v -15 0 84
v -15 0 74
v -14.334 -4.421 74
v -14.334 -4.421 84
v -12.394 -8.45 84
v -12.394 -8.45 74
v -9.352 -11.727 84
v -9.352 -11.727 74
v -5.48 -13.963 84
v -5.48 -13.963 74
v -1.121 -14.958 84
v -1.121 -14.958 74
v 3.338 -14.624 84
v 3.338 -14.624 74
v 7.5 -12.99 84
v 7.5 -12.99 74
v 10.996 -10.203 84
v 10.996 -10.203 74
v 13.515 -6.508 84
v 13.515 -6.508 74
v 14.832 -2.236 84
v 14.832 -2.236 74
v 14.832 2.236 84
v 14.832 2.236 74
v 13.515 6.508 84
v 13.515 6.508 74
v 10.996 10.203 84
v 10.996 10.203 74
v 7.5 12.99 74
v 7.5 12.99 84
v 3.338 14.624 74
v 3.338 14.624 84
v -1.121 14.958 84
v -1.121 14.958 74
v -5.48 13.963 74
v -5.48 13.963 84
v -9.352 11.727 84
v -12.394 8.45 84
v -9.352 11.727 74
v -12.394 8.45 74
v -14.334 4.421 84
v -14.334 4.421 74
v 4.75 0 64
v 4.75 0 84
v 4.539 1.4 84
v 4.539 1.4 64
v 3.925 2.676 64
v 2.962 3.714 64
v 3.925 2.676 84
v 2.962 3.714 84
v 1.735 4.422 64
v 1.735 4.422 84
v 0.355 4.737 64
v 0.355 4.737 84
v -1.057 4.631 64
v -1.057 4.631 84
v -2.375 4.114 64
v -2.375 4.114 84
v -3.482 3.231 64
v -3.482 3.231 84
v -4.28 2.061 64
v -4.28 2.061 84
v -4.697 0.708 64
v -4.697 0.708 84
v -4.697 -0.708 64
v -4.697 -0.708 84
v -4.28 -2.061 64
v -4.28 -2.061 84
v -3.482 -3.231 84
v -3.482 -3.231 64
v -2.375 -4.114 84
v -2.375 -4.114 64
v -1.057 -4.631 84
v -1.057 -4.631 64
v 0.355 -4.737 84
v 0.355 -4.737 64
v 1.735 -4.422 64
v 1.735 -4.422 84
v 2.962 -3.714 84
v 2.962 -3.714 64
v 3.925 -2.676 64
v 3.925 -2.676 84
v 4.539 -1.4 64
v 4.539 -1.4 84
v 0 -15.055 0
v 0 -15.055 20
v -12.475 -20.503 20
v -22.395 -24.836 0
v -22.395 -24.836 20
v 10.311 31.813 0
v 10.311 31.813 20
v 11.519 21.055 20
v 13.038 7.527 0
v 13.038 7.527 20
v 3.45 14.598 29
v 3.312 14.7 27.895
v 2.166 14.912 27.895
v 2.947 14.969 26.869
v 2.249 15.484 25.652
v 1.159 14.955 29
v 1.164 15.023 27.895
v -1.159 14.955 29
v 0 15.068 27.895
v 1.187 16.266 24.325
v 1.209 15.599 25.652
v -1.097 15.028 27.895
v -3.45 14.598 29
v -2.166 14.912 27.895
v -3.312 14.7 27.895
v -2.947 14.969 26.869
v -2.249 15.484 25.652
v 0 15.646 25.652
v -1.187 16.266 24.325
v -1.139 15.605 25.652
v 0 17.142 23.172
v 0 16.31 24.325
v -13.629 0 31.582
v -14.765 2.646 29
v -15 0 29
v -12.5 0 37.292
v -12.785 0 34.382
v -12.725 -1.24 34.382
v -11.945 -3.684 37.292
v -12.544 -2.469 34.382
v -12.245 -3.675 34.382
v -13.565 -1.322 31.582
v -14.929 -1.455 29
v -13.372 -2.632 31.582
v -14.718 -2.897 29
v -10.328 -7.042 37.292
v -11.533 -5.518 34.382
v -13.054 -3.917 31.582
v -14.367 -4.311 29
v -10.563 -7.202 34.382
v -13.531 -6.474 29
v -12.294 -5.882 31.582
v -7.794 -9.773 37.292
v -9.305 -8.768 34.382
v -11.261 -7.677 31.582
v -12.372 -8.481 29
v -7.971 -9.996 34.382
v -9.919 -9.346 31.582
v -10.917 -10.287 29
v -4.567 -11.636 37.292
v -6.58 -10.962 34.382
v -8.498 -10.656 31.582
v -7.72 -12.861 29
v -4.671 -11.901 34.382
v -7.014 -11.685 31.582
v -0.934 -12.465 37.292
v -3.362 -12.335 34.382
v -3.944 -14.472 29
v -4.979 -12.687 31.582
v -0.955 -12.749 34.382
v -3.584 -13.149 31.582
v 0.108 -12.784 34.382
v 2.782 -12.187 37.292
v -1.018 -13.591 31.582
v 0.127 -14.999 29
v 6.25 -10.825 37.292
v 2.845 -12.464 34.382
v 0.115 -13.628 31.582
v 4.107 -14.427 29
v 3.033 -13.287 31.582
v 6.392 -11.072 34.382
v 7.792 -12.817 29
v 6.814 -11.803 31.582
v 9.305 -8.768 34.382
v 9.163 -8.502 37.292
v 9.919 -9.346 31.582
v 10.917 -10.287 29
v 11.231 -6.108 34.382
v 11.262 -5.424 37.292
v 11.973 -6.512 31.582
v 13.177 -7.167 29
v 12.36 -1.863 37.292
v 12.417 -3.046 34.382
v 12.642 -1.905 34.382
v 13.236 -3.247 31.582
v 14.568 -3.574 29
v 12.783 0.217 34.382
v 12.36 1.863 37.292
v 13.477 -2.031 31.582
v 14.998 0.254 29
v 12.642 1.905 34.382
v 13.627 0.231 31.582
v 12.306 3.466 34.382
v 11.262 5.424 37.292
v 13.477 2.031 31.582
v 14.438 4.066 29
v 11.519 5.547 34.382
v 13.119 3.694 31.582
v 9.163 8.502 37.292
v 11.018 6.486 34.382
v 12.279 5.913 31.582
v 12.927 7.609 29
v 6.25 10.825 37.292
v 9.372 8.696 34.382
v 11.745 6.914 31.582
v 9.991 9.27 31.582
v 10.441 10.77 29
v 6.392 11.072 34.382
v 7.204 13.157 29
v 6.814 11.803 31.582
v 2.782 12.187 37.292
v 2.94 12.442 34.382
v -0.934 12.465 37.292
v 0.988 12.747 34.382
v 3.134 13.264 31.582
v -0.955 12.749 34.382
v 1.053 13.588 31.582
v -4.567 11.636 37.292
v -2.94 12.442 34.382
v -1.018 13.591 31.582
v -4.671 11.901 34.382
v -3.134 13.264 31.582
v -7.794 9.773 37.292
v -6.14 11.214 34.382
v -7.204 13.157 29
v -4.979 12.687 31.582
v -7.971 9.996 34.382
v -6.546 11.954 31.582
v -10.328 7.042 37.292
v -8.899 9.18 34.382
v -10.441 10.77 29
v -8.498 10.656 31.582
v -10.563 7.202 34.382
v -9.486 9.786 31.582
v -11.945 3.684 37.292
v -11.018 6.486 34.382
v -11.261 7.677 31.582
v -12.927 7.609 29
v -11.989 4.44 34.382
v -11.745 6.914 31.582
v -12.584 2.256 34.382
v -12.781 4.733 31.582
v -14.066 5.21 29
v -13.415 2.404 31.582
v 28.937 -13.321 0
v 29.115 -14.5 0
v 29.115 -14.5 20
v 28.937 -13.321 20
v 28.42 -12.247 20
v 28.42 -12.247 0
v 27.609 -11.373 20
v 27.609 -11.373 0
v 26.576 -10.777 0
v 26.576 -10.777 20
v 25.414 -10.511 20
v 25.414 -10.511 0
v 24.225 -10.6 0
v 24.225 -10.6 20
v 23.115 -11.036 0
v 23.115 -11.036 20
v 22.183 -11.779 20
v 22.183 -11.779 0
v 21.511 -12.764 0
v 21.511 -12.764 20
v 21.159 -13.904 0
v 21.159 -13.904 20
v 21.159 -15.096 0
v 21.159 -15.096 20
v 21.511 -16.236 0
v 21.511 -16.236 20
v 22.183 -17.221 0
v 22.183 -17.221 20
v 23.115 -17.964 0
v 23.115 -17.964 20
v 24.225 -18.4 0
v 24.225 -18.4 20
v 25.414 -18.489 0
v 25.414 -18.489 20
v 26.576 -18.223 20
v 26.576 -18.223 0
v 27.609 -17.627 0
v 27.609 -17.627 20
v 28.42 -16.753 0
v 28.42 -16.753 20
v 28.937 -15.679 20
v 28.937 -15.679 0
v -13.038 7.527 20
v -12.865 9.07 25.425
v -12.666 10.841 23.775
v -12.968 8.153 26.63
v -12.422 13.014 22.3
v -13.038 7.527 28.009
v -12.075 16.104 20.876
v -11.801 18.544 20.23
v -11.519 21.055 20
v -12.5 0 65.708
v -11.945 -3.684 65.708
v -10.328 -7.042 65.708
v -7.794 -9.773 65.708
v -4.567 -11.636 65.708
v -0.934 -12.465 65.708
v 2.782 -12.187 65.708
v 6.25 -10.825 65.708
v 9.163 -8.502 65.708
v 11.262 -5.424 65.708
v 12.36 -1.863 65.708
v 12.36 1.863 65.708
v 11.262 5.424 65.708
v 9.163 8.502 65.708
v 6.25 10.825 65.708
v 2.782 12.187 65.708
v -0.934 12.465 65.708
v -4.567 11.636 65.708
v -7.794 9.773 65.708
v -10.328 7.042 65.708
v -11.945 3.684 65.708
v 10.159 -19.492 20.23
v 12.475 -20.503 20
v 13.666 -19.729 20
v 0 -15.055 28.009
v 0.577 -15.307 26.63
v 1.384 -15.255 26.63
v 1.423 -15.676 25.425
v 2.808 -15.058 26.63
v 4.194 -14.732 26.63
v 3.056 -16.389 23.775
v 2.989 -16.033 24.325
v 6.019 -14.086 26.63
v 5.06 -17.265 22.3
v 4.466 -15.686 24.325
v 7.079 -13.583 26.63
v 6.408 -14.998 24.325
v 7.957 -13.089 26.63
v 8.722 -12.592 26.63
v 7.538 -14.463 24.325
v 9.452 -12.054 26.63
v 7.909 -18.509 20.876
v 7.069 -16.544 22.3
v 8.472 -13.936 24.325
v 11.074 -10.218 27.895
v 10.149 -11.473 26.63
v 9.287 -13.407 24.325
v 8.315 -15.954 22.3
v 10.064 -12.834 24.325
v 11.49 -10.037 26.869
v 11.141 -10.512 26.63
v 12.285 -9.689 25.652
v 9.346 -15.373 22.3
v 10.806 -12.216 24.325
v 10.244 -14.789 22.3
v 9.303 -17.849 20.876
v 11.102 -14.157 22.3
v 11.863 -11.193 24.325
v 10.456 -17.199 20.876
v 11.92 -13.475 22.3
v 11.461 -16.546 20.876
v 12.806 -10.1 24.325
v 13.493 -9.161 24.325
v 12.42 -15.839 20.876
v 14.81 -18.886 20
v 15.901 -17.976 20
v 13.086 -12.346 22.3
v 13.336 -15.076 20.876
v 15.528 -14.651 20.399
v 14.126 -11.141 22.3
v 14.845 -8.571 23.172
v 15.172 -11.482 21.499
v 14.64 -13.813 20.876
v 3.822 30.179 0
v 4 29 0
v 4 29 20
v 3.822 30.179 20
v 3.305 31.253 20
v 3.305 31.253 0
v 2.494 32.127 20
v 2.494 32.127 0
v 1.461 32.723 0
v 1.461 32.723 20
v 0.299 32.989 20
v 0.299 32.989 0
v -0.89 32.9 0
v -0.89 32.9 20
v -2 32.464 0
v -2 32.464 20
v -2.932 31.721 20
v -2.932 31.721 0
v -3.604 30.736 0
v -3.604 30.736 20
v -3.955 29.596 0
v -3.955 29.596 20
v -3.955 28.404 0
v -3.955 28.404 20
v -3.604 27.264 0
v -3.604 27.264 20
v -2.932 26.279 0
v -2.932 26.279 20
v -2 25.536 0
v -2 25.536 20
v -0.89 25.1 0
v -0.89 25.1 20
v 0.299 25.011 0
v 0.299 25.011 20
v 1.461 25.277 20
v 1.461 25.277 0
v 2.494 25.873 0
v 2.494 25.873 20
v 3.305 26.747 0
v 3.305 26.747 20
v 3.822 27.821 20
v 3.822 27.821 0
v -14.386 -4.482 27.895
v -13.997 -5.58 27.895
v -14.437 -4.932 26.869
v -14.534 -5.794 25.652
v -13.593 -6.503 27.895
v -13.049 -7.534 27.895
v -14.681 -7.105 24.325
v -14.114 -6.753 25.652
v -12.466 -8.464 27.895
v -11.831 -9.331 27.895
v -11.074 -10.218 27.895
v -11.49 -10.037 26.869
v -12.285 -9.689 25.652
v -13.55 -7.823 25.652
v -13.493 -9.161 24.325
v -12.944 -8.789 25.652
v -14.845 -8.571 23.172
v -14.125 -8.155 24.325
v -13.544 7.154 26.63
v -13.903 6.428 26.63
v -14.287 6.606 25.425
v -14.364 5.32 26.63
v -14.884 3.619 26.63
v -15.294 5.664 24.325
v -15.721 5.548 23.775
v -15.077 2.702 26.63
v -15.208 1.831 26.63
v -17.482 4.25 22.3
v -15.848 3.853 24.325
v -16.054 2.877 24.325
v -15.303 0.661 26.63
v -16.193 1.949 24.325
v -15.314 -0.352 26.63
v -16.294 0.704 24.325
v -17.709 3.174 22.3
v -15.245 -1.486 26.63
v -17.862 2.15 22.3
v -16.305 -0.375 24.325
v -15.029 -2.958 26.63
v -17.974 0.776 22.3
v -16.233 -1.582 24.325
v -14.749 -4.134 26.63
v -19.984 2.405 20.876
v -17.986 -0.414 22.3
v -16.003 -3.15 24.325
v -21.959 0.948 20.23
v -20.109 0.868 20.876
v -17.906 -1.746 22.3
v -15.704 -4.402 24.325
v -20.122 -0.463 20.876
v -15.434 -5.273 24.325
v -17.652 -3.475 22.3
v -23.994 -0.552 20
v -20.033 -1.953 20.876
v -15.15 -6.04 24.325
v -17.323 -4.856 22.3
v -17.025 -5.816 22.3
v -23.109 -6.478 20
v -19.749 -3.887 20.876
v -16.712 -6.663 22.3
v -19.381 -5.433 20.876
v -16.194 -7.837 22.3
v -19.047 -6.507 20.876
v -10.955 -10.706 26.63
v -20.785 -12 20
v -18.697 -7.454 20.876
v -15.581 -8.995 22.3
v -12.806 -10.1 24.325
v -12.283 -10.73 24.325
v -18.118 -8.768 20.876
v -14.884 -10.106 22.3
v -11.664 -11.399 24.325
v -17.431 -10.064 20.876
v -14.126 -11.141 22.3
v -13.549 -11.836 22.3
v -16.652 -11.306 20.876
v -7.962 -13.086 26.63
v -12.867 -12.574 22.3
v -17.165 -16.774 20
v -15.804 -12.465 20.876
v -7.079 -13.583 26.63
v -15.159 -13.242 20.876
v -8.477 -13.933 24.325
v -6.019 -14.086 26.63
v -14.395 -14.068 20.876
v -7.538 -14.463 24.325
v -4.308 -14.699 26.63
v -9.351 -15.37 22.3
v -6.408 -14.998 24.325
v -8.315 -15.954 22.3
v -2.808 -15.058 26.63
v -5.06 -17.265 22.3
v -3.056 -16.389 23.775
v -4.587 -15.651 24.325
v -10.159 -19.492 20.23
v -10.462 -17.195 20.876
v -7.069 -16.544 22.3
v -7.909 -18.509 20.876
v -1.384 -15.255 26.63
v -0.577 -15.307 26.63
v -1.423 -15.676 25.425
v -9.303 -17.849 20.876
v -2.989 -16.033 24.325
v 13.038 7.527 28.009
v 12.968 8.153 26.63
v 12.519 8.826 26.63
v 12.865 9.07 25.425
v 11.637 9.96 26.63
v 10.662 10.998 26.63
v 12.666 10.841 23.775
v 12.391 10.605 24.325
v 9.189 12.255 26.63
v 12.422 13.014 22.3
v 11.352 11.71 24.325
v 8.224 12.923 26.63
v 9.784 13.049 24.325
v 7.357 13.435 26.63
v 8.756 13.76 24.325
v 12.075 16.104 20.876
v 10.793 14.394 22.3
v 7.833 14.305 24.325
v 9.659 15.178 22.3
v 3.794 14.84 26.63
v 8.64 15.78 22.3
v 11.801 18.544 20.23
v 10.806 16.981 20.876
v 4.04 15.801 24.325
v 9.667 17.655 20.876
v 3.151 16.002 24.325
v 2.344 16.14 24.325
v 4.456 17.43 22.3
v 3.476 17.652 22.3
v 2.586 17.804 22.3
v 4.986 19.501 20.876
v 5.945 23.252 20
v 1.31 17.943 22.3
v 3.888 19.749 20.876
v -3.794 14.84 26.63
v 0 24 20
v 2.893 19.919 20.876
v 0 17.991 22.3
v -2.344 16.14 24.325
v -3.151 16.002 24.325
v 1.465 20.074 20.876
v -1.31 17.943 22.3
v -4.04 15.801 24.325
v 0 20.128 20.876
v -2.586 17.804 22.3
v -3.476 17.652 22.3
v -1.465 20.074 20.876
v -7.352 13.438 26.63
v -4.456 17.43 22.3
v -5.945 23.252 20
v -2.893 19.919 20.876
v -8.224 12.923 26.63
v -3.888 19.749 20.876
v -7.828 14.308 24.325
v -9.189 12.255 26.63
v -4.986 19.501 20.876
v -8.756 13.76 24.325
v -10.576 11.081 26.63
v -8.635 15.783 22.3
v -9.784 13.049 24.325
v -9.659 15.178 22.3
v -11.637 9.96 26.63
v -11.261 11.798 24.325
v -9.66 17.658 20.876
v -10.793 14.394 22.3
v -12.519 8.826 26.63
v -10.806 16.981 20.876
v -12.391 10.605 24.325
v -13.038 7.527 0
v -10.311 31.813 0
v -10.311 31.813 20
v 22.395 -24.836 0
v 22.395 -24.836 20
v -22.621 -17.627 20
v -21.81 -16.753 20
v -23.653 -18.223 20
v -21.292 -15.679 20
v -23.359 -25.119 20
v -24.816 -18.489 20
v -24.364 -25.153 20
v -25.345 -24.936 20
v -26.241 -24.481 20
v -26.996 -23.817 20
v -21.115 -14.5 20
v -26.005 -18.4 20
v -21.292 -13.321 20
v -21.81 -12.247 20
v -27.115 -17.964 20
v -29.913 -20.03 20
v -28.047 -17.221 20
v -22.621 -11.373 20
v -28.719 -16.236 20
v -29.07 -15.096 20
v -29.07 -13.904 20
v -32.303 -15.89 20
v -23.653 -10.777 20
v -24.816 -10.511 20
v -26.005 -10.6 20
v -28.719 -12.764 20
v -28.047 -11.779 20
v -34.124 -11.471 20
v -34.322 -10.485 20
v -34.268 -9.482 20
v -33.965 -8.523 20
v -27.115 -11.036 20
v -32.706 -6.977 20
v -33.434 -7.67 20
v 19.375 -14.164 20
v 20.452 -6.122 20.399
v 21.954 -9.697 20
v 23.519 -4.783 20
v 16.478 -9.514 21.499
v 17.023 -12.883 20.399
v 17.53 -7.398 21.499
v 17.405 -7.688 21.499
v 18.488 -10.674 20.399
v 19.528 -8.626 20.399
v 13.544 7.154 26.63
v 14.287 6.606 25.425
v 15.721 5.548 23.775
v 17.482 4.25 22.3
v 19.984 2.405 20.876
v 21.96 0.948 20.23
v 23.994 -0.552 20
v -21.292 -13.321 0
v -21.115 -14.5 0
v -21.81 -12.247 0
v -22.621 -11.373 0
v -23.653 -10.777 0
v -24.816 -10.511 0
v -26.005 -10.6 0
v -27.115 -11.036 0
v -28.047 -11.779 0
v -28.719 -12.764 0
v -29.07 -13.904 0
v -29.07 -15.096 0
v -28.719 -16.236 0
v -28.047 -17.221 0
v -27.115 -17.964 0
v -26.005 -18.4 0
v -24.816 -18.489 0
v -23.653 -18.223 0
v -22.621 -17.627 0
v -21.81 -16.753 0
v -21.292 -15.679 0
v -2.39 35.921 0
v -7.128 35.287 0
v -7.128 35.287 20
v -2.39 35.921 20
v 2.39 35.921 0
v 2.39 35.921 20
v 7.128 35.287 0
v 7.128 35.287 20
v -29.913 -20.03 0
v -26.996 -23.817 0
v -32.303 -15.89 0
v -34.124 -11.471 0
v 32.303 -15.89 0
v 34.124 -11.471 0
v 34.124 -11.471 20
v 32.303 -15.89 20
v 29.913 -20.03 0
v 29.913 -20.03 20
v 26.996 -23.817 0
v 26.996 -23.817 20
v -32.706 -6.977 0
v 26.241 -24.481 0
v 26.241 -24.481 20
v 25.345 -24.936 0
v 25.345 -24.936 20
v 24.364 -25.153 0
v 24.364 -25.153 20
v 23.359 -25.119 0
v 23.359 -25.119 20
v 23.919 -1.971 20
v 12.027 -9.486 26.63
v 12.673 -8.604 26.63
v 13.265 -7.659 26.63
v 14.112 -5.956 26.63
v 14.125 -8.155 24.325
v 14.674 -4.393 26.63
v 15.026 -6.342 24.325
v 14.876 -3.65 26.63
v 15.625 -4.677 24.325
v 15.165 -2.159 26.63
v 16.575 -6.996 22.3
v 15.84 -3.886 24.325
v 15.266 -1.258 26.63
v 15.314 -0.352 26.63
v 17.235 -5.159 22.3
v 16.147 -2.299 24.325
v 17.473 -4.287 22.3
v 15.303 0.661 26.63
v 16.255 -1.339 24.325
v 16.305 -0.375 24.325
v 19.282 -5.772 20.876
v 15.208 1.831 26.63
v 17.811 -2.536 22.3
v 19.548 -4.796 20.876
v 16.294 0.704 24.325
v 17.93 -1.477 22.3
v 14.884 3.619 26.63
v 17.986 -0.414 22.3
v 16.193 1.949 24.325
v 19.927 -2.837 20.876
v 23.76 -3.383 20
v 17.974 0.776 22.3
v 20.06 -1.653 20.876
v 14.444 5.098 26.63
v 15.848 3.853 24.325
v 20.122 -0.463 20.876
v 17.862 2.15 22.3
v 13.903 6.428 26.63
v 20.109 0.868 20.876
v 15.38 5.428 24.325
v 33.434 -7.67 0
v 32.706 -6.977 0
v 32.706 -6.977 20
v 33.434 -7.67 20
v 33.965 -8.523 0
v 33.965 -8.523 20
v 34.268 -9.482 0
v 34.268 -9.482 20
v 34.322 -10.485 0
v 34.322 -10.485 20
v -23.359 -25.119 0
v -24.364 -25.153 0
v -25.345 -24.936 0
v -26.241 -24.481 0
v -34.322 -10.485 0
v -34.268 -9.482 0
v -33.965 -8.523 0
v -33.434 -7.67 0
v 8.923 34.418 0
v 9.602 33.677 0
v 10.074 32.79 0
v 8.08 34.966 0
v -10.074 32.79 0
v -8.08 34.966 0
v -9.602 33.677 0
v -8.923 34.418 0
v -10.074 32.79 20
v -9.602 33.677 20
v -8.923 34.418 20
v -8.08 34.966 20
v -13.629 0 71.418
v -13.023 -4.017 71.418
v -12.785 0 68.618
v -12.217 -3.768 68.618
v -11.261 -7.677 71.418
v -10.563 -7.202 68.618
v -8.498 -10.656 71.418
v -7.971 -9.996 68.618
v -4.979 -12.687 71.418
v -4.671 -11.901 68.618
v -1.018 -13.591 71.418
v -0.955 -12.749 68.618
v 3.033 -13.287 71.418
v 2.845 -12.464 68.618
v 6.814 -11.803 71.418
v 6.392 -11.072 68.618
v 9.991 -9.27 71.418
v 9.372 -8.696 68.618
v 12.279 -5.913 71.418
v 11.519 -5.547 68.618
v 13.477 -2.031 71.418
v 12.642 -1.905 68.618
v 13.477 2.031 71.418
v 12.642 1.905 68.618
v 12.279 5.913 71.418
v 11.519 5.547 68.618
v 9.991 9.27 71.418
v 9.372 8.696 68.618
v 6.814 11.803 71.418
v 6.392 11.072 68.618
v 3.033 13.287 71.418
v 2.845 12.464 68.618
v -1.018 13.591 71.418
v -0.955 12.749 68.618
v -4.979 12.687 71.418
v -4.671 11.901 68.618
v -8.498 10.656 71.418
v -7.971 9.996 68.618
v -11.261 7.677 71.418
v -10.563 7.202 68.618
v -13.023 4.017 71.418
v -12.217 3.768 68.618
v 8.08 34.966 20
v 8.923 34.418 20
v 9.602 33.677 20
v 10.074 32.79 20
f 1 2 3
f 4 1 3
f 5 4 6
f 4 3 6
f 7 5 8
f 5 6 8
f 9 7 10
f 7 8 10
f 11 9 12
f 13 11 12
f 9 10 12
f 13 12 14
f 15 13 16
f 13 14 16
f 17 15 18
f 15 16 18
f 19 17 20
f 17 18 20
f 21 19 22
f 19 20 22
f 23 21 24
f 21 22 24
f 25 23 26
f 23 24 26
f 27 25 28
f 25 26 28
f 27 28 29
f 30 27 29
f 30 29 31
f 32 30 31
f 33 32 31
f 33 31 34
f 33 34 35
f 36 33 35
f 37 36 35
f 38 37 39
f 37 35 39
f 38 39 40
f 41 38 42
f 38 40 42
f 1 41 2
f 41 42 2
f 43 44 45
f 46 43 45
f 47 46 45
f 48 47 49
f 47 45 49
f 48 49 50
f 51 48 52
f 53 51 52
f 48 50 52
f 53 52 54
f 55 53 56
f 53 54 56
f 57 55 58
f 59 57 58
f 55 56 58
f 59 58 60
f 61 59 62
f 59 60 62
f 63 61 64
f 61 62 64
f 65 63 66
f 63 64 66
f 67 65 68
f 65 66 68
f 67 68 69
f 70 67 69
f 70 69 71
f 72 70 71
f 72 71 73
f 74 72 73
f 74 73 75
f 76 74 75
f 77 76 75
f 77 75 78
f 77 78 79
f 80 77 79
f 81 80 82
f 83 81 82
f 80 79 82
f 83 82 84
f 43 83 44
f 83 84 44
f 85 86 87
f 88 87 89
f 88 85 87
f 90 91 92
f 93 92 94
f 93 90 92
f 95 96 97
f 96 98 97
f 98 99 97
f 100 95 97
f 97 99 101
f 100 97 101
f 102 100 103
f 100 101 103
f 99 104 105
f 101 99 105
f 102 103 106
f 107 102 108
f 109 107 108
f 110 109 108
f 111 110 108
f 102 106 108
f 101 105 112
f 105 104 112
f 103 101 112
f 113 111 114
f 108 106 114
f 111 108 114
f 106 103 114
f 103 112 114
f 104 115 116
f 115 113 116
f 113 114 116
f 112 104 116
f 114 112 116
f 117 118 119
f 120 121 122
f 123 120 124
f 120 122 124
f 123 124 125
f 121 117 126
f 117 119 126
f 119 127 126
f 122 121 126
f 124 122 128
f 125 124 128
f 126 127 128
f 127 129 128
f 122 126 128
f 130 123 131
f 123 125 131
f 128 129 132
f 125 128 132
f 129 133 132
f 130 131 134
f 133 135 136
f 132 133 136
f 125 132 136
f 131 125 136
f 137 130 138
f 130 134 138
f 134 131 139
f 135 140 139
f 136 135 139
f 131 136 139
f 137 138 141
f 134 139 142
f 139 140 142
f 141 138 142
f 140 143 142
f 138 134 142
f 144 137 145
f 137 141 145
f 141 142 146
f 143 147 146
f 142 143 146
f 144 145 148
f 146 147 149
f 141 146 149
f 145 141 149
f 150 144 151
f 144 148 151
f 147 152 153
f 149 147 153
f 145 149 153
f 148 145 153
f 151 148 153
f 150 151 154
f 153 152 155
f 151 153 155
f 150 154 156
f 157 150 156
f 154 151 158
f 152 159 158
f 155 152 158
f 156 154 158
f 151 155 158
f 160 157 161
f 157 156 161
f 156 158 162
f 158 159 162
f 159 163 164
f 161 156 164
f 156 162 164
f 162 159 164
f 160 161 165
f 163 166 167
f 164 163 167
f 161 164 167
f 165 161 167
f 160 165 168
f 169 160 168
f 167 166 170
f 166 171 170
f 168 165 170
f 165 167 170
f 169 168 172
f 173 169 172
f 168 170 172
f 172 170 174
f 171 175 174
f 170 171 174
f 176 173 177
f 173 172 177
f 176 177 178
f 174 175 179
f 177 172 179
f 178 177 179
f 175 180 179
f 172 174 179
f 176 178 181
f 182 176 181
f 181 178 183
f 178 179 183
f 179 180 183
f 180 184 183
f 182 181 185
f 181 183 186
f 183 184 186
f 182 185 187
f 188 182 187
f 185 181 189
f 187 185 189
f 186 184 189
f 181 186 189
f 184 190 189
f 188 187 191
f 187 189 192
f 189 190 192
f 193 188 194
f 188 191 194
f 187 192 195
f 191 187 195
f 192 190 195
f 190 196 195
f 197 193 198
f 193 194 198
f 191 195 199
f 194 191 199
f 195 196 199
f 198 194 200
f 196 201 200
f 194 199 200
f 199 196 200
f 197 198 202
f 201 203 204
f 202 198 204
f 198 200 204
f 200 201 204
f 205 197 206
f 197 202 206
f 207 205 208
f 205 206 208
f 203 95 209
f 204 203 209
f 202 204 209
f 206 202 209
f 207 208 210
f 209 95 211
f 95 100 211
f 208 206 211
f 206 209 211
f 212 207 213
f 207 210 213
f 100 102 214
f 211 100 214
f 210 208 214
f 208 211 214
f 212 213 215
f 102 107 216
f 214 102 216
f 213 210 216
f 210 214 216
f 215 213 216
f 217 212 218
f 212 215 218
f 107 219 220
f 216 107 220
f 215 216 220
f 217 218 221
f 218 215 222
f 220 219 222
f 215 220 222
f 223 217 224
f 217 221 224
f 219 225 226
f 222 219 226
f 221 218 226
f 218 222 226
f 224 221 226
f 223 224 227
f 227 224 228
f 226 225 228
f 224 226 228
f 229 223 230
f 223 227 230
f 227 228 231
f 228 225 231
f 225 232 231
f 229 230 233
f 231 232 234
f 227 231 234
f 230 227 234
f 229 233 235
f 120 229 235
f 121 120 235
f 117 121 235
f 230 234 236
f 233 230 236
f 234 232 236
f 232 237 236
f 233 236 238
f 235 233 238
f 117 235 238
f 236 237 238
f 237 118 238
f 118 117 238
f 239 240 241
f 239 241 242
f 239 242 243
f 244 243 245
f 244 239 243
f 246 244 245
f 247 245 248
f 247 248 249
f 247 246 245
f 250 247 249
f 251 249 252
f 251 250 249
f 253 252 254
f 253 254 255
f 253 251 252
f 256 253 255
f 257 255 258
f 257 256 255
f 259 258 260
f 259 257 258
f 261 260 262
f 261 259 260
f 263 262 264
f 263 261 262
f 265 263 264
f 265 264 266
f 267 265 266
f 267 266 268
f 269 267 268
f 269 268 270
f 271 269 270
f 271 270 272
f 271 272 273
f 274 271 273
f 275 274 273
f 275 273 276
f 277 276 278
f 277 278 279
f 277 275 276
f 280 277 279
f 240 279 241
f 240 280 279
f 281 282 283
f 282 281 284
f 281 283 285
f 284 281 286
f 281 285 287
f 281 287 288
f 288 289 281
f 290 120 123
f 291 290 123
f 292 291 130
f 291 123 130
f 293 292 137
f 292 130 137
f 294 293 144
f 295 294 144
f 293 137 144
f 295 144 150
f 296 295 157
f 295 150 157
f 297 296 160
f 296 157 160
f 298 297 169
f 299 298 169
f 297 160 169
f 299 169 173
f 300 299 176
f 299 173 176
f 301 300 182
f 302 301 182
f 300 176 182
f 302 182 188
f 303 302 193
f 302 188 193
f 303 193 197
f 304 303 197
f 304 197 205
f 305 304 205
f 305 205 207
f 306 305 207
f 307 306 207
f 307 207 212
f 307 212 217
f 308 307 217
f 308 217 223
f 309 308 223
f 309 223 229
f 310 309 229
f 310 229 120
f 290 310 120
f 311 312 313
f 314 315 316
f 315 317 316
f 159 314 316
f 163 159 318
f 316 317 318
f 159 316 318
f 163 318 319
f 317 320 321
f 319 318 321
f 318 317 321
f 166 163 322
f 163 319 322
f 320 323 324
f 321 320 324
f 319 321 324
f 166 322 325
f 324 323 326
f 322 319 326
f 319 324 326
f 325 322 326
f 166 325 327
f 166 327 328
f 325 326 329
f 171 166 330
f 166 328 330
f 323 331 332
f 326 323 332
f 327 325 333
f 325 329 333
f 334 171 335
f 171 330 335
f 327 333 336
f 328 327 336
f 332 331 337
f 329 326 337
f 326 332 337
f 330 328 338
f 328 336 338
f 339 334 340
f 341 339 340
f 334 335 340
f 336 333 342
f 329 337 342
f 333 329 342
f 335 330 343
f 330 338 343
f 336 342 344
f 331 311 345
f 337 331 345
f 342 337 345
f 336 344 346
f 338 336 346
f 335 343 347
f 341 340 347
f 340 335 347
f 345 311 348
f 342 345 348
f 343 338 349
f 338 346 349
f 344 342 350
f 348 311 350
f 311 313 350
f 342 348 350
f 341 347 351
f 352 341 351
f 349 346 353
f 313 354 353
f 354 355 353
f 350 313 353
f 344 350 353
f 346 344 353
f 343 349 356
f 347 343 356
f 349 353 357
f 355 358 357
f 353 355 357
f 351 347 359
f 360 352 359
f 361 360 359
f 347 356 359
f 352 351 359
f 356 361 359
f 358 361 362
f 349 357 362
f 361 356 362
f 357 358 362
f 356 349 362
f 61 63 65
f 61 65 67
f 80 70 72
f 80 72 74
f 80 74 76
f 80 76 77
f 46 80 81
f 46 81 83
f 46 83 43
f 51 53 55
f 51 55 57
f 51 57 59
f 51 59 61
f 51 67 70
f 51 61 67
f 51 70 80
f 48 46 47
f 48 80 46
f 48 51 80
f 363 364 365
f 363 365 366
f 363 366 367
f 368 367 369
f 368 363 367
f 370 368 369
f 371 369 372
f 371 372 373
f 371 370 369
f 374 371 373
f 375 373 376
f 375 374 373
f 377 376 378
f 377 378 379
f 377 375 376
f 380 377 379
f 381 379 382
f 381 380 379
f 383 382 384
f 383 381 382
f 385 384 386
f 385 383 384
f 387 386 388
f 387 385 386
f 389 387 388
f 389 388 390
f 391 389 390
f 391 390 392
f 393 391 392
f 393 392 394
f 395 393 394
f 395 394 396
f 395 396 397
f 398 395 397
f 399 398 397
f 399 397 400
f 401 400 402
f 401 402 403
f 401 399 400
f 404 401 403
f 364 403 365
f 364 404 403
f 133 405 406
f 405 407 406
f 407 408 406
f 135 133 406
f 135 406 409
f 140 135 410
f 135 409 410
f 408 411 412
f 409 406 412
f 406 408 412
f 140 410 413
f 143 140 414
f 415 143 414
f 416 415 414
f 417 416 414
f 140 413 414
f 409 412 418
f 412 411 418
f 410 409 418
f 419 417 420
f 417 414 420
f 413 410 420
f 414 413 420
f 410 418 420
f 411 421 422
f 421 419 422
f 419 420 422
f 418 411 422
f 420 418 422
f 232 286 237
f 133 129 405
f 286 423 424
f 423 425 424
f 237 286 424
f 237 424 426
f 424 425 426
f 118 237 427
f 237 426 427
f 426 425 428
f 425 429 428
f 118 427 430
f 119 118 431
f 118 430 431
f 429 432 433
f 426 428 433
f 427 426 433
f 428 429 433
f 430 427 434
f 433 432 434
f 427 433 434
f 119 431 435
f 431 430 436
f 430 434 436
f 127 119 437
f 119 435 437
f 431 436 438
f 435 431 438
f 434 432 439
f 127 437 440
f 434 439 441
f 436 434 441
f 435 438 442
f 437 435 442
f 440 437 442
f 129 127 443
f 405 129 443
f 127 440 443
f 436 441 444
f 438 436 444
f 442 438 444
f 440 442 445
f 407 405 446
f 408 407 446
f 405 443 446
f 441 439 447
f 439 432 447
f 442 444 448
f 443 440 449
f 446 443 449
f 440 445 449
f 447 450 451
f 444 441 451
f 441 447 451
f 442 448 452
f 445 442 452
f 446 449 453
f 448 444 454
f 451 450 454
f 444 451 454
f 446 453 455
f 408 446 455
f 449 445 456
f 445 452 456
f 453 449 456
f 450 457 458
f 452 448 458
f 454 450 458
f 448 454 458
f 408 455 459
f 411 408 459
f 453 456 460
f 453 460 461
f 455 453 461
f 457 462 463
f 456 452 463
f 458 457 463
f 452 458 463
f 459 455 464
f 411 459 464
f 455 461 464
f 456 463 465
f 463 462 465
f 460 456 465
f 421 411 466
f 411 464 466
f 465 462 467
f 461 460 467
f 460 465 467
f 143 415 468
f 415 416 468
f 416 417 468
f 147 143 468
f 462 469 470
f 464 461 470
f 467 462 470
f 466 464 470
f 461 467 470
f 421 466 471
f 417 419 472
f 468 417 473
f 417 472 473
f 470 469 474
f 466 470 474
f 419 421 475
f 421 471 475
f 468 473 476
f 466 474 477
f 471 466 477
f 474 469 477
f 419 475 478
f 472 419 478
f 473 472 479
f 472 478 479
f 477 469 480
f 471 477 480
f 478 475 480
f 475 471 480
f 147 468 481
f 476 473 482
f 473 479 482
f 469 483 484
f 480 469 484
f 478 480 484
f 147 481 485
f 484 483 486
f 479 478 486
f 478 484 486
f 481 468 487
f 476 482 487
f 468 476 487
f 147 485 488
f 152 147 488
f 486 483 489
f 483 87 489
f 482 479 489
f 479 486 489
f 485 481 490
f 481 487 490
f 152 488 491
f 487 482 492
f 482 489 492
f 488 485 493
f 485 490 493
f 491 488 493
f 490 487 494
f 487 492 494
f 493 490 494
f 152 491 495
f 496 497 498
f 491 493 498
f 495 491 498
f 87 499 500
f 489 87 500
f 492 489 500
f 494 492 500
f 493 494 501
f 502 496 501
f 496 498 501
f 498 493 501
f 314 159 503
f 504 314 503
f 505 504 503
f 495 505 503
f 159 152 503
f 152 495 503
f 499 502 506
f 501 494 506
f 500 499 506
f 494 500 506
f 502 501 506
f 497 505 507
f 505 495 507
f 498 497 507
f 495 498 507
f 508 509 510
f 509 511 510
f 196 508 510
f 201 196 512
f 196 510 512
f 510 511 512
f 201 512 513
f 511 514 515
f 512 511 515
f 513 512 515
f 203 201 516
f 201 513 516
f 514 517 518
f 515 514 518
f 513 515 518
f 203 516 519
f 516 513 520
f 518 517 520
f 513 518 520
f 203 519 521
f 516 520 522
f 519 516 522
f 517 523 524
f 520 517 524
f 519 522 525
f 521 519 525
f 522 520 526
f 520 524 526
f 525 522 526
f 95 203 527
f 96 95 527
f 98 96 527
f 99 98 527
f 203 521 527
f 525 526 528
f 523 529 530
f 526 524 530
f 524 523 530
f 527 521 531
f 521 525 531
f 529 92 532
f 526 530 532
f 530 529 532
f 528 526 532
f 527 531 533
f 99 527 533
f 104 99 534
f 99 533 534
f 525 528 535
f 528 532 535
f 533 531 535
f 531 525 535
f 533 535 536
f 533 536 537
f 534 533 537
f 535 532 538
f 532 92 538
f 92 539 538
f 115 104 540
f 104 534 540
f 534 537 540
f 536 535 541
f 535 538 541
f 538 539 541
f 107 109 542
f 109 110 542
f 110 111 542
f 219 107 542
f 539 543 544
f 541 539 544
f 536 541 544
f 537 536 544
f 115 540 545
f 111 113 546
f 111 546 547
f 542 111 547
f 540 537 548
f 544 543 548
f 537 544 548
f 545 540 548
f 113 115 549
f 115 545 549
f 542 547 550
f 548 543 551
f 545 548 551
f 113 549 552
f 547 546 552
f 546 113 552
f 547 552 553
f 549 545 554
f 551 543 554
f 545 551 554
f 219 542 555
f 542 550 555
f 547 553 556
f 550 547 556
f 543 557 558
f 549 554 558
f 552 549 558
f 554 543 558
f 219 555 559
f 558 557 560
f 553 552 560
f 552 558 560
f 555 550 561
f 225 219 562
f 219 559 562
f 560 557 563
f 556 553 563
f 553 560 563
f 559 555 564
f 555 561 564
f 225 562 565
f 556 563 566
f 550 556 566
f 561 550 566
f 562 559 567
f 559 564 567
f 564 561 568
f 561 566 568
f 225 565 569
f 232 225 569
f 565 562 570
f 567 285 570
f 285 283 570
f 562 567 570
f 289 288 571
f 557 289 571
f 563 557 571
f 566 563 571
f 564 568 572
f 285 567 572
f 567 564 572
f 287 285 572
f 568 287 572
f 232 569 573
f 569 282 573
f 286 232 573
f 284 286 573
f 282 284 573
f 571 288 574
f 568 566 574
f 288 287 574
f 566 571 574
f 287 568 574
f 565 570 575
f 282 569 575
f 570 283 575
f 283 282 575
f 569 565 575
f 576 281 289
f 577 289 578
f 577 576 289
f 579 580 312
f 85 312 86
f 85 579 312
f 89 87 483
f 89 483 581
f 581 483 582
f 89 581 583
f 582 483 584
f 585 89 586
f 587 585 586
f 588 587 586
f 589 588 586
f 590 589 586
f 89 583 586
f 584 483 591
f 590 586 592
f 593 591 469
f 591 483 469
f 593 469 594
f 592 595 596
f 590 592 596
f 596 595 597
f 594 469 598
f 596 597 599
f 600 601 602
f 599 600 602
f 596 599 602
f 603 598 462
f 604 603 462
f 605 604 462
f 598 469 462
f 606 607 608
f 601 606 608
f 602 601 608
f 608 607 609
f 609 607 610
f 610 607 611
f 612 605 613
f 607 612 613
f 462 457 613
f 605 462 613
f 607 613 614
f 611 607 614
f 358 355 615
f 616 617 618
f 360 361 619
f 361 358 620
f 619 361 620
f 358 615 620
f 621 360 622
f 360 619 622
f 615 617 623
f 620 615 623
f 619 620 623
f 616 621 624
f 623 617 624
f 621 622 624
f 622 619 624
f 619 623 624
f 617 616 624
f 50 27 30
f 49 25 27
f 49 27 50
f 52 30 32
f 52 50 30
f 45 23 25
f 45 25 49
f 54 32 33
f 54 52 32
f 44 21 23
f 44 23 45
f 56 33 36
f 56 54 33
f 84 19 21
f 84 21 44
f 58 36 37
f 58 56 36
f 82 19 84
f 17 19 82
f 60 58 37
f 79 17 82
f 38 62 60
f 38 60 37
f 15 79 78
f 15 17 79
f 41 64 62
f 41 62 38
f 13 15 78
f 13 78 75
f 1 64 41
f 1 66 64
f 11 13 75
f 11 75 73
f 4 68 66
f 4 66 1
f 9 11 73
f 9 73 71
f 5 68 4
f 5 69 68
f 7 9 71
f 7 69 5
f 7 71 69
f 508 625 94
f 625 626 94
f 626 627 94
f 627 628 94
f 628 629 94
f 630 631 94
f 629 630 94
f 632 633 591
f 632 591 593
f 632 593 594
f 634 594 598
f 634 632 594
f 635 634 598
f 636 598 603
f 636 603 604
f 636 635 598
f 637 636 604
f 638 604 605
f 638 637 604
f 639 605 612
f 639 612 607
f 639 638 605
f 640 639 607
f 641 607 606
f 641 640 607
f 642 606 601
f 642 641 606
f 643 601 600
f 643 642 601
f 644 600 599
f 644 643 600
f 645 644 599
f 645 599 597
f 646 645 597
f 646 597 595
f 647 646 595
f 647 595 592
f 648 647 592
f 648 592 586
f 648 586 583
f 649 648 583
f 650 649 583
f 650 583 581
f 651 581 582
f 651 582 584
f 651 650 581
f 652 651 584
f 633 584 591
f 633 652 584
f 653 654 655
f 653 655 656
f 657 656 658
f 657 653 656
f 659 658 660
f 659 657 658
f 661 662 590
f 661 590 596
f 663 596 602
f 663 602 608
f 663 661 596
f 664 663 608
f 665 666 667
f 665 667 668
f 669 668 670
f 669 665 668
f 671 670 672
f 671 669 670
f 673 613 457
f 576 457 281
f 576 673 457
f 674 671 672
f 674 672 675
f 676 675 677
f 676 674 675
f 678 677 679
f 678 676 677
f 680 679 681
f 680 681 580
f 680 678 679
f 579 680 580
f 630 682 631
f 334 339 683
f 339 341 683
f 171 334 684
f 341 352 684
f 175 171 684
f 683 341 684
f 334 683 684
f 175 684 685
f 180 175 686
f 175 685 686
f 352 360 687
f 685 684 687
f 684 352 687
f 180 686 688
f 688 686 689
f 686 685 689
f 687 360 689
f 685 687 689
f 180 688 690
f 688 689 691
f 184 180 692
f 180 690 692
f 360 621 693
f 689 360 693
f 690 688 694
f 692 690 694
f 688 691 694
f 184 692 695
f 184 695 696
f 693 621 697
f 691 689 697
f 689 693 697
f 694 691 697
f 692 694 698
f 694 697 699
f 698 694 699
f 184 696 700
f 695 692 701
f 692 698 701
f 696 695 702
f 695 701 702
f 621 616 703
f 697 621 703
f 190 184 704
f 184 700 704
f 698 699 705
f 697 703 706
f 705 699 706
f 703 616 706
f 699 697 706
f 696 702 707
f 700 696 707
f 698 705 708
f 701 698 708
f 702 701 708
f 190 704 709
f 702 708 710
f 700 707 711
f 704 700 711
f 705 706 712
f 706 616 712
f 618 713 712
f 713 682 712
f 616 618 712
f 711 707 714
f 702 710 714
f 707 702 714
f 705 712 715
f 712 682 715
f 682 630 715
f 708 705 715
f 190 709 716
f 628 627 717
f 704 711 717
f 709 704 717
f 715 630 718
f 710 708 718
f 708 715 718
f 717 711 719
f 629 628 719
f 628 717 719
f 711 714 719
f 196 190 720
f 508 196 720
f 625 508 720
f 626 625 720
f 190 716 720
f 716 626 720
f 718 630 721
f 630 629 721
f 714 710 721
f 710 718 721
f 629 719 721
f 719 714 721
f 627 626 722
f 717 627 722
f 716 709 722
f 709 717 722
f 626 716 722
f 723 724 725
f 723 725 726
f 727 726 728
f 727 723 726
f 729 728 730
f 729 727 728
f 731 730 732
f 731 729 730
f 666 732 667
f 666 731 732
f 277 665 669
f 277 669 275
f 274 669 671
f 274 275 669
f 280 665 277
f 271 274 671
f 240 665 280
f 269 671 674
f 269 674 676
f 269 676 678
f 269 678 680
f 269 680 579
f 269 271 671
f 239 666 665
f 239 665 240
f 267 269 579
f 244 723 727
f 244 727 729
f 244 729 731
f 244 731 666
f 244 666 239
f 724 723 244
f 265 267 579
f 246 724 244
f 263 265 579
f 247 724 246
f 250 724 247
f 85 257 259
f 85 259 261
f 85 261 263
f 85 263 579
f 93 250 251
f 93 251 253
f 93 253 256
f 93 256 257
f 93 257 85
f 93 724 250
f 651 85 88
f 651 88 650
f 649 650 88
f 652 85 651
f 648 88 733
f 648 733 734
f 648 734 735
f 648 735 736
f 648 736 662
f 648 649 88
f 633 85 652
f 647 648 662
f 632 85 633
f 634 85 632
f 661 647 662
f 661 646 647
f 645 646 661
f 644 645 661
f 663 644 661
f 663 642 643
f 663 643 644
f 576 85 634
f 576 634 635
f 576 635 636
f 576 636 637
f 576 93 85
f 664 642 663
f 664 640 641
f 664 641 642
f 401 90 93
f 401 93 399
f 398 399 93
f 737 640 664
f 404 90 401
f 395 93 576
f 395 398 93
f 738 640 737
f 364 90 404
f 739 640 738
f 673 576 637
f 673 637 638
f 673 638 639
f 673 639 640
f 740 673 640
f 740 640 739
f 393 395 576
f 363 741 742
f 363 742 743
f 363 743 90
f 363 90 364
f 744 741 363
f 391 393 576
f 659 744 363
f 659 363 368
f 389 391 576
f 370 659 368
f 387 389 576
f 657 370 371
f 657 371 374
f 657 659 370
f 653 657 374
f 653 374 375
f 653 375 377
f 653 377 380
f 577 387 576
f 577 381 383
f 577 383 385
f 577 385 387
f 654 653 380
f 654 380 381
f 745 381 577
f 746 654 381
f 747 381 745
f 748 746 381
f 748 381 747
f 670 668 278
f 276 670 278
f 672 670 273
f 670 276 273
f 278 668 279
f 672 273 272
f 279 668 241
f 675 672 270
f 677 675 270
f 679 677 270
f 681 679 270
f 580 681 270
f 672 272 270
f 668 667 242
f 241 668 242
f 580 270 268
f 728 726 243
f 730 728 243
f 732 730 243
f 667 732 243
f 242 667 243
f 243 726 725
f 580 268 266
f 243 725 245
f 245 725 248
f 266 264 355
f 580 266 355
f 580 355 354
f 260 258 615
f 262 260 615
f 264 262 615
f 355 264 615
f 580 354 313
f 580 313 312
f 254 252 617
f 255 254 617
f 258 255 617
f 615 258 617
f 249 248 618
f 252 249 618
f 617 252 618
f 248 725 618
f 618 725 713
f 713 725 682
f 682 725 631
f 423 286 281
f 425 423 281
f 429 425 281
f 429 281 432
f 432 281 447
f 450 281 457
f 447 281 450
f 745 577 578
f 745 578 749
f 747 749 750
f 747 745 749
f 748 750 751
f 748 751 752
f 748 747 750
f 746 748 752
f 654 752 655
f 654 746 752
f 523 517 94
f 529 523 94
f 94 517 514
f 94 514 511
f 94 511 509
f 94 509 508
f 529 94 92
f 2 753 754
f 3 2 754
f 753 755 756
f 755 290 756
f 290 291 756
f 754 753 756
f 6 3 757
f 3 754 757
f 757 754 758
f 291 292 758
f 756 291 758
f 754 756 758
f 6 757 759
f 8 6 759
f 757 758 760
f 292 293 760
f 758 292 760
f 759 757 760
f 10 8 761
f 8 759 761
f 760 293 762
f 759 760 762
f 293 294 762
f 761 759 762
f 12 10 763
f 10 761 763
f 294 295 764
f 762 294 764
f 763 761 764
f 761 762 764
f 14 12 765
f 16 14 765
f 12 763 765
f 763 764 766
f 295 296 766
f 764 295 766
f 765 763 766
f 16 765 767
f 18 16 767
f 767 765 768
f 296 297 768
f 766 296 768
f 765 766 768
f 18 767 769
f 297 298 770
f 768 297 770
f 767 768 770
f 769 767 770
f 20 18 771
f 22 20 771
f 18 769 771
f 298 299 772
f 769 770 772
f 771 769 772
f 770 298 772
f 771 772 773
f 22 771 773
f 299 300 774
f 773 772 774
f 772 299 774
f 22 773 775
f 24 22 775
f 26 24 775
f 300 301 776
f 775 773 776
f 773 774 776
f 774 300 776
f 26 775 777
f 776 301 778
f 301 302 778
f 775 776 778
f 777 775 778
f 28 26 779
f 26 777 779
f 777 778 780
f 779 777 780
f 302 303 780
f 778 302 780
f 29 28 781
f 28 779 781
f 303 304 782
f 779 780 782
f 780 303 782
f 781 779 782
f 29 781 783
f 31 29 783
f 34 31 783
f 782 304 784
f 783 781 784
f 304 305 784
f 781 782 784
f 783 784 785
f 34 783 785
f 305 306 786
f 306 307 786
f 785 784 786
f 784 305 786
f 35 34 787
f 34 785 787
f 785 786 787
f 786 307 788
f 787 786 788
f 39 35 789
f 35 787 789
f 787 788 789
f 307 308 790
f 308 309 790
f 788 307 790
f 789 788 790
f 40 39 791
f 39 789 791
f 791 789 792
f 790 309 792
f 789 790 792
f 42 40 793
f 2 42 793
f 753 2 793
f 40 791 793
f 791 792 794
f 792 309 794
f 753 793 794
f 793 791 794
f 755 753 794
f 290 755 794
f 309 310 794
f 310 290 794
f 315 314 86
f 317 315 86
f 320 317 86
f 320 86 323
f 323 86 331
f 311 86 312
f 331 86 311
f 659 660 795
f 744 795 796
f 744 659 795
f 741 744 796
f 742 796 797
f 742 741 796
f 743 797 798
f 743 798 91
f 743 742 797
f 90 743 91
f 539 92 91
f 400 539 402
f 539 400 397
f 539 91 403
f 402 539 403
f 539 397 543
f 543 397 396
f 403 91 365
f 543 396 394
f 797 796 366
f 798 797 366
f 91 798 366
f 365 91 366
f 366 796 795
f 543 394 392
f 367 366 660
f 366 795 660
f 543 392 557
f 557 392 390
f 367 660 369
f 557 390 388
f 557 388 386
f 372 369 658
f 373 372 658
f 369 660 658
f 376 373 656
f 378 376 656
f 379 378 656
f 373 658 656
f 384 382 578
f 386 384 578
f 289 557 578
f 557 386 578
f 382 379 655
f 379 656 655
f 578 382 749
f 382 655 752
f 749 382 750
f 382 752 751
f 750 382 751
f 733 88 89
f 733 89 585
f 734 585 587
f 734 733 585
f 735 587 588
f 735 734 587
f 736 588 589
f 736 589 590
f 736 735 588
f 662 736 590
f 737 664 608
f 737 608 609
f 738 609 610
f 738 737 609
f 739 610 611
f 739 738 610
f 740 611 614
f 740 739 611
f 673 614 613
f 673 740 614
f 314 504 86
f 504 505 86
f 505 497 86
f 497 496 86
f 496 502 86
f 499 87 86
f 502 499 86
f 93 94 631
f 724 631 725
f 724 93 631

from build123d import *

# Parameters (mm, degrees)
SKETCH1_R           = 4
BOSS_EXTRUDE1_DEPTH = 20
SKETCH2_R           = 15
BOSS_EXTRUDE2_DEPTH = 9
SKETCH3_R           = 12.5
BOSS_EXTRUDE3_DEPTH = 45
SKETCH5_R           = 15
BOSS_EXTRUDE4_DEPTH = 10
FILLET3_R           = 9
FILLET4_R           = 15
SKETCH6_R           = 4.75
CUT_EXTRUDE1_DEPTH  = 20


with BuildPart() as part:
    # Sketch1 → Boss-Extrude1 (new body)
    with BuildSketch(Plane.XY):
        with BuildLine():
            Line((10.311065776, 31.812768666), (13.037811649, 7.527384065))
            Line((13.037811649, 7.527384065), (32.706198717, -6.976739431))
            ThreePointArc((32.706198717, -6.976739431), (34.146892061, -8.992770752), (34.123690383, -11.470560347))
            ThreePointArc((34.123690383, -11.470560347), (31.176914536, -18), (26.995641847, -23.816702569))
            ThreePointArc((26.995641847, -23.816702569), (24.861413952, -25.075690609), (22.395132941, -24.836029235))
            Line((22.395132941, -24.836029235), (0, -15.05476813))
            Line((0, -15.05476813), (-22.395132941, -24.836029235))
            ThreePointArc((-22.395132941, -24.836029235), (-24.861413952, -25.075690609), (-26.995641847, -23.816702569))
            ThreePointArc((-26.995641847, -23.816702569), (-31.176914536, -18), (-34.123690383, -11.470560347))
            ThreePointArc((-34.123690383, -11.470560347), (-34.146892061, -8.992770752), (-32.706198717, -6.976739431))
            Line((-32.706198717, -6.976739431), (-13.037811649, 7.527384065))
            Line((-13.037811649, 7.527384065), (-10.311065776, 31.812768666))
            ThreePointArc((-10.311065776, 31.812768666), (-9.285478109, 34.068461361), (-7.128048535, 35.287262916))
            ThreePointArc((-7.128048535, 35.287262916), (0, 36), (7.128048535, 35.287262916))
            ThreePointArc((7.128048535, 35.287262916), (9.285478109, 34.068461361), (10.311065776, 31.812768666))
        make_face()
        with Locations((0, 29)):
            Circle(SKETCH1_R, mode=Mode.SUBTRACT)
        with Locations((-25.11473671, -14.5)):
            Circle(SKETCH1_R, mode=Mode.SUBTRACT)
        with Locations((25.11473671, -14.5)):
            Circle(SKETCH1_R, mode=Mode.SUBTRACT)
    extrude(amount=BOSS_EXTRUDE1_DEPTH)

    # Sketch2 → Boss-Extrude2 (add)
    with BuildSketch(Plane.XY.offset(20)):
        with Locations(Location((0, 0, 0), (0, 0, 180))):
            Circle(SKETCH2_R)
    extrude(amount=BOSS_EXTRUDE2_DEPTH)

    # Sketch3 → Boss-Extrude3 (add)
    with BuildSketch(Plane.XY.offset(29)):
        with Locations(Location((0, 0, 0), (0, 0, 180))):
            Circle(SKETCH3_R)
    extrude(amount=BOSS_EXTRUDE3_DEPTH)

    # Sketch5 → Boss-Extrude4 (add)
    with BuildSketch(Plane.XY.offset(74)):
        with Locations(Location((0, 0, 0), (0, 0, 180))):
            Circle(SKETCH5_R)
    extrude(amount=BOSS_EXTRUDE4_DEPTH)

    # Fillet3
    # the kernel refuses this fillet: 9 mm, written as the material it adds along each edge
    with BuildSketch(Plane(origin=(0, 0, 20), x_dir=(-1, 0, 0), z_dir=(0, 1, 0))) as fillet3_piece_1_section:
        with BuildLine():
            CenterArc((15 + FILLET3_R, FILLET3_R), FILLET3_R, 180, 90)
            Line((15 + FILLET3_R, 0), (15, 0))
            Line((15, 0), (15, FILLET3_R))
        make_face()
    fillet3_piece_1 = revolve(axis=Axis((0, 0, 20), (0, 0, 1)), mode=Mode.PRIVATE)
    fillet3_piece_1 = split(fillet3_piece_1, bisect_by=Plane(origin=(-2.104235359, 18.693633693, 22.074494406), z_dir=(-0.5935073720778344, -0.8048285527298736, 0)), keep=Keep.TOP, mode=Mode.PRIVATE)
    fillet3_piece_1 = split(fillet3_piece_1, bisect_by=Plane(origin=(-19.127560762, 3.036600307, 22.074494406), z_dir=(0.5935073720778299, -0.8048285527298771, 0)), keep=Keep.TOP, mode=Mode.PRIVATE)
    fillet3_piece_1 = split(fillet3_piece_1, bisect_by=Plane(origin=(-8.489861011, -18.762785739, 22.074494406), z_dir=(-0.4002482863162174, 0.9164067379176843, 0)), keep=Keep.TOP, mode=Mode.PRIVATE)
    add(fillet3_piece_1)
    with BuildSketch(Plane(origin=(0, 0, 20), x_dir=(-1, 0, 0), z_dir=(0, 1, 0))) as fillet3_piece_2_section:
        with BuildLine():
            CenterArc((15 + FILLET3_R, FILLET3_R), FILLET3_R, 180, 90)
            Line((15 + FILLET3_R, 0), (15, 0))
            Line((15, 0), (15, FILLET3_R))
        make_face()
    fillet3_piece_2 = revolve(axis=Axis((0, 0, 20), (0, 0, 1)), mode=Mode.PRIVATE)
    fillet3_piece_2 = split(fillet3_piece_2, bisect_by=Plane(origin=(12.004118745, 16.733826801, 22.074494266), z_dir=(-0.9937556583940517, -0.11157818518780918, 0)), keep=Keep.TOP, mode=Mode.PRIVATE)
    fillet3_piece_2 = split(fillet3_piece_2, bisect_by=Plane(origin=(-12.193553488, 15.046652486, 22.074494266), z_dir=(0.9937556583940516, -0.1115781851878097, 0)), keep=Keep.TOP, mode=Mode.PRIVATE)
    fillet3_piece_2 = split(fillet3_piece_2, bisect_by=Plane(origin=(-17.241277087, -7.524496557, 22.074494266), z_dir=(0.4002482863162113, 0.916406737917687, 0)), keep=Keep.TOP, mode=Mode.PRIVATE)
    add(fillet3_piece_2)
    with BuildSketch(Plane(origin=(0, 0, 20), x_dir=(-1, 0, 0), z_dir=(0, 1, 0))) as fillet3_piece_3_section:
        with BuildLine():
            CenterArc((15 + FILLET3_R, FILLET3_R), FILLET3_R, 180, 90)
            Line((15 + FILLET3_R, 0), (15, 0))
            Line((15, 0), (15, FILLET3_R))
        make_face()
    fillet3_piece_3 = revolve(axis=Axis((0, 0, 20), (0, 0, 1)), mode=Mode.PRIVATE)
    fillet3_piece_3 = split(fillet3_piece_3, bisect_by=Plane(origin=(12.39704086, -20.469279127, 20.602322319), z_dir=(0.4002482863162113, 0.916406737917687, 0)), keep=Keep.TOP, mode=Mode.PRIVATE)
    fillet3_piece_3 = split(fillet3_piece_3, bisect_by=Plane(origin=(16.223816266, -7.968881057, 20.602322319), z_dir=(0.4002482863162174, -0.9164067379176843, 0)), keep=Keep.TOP, mode=Mode.PRIVATE)
    add(fillet3_piece_3)

    # Fillet4
    # the kernel refuses this fillet: 15 mm, written as the material it adds along each edge
    with BuildSketch(Plane(origin=(0, 0, 29), x_dir=(-1, 0, 0), z_dir=(0, 1, 0))) as fillet4_piece_1:
        with BuildLine():
            CenterArc((27.5, 8.291561976), FILLET4_R, 180, 33.557309762)
            Line((12.5, 8.291561976), (12.5, 0))
            Line((12.5, 0), (15, 0))
        make_face()
    revolve(axis=Axis((0, 0, 29), (0, 0, 1)))
    with BuildSketch(Plane(origin=(0, 0, 74), x_dir=(-1, 0, 0), z_dir=(0, 1, 0))) as fillet4_piece_2:
        with BuildLine():
            CenterArc((27.5, -8.291561976), FILLET4_R, 146.442690238, 33.557309762)
            Line((15, 0), (12.5, 0))
            Line((12.5, 0), (12.5, -8.291561976))
        make_face()
    revolve(axis=Axis((0, 0, 74), (0, 0, 1)))

    # Sketch6 → Cut-Extrude1 (cut)
    with BuildSketch(Plane.XY.offset(84)):
        Circle(SKETCH6_R)
    extrude(amount=-CUT_EXTRUDE1_DEPTH, mode=Mode.SUBTRACT)


solid = part.part
